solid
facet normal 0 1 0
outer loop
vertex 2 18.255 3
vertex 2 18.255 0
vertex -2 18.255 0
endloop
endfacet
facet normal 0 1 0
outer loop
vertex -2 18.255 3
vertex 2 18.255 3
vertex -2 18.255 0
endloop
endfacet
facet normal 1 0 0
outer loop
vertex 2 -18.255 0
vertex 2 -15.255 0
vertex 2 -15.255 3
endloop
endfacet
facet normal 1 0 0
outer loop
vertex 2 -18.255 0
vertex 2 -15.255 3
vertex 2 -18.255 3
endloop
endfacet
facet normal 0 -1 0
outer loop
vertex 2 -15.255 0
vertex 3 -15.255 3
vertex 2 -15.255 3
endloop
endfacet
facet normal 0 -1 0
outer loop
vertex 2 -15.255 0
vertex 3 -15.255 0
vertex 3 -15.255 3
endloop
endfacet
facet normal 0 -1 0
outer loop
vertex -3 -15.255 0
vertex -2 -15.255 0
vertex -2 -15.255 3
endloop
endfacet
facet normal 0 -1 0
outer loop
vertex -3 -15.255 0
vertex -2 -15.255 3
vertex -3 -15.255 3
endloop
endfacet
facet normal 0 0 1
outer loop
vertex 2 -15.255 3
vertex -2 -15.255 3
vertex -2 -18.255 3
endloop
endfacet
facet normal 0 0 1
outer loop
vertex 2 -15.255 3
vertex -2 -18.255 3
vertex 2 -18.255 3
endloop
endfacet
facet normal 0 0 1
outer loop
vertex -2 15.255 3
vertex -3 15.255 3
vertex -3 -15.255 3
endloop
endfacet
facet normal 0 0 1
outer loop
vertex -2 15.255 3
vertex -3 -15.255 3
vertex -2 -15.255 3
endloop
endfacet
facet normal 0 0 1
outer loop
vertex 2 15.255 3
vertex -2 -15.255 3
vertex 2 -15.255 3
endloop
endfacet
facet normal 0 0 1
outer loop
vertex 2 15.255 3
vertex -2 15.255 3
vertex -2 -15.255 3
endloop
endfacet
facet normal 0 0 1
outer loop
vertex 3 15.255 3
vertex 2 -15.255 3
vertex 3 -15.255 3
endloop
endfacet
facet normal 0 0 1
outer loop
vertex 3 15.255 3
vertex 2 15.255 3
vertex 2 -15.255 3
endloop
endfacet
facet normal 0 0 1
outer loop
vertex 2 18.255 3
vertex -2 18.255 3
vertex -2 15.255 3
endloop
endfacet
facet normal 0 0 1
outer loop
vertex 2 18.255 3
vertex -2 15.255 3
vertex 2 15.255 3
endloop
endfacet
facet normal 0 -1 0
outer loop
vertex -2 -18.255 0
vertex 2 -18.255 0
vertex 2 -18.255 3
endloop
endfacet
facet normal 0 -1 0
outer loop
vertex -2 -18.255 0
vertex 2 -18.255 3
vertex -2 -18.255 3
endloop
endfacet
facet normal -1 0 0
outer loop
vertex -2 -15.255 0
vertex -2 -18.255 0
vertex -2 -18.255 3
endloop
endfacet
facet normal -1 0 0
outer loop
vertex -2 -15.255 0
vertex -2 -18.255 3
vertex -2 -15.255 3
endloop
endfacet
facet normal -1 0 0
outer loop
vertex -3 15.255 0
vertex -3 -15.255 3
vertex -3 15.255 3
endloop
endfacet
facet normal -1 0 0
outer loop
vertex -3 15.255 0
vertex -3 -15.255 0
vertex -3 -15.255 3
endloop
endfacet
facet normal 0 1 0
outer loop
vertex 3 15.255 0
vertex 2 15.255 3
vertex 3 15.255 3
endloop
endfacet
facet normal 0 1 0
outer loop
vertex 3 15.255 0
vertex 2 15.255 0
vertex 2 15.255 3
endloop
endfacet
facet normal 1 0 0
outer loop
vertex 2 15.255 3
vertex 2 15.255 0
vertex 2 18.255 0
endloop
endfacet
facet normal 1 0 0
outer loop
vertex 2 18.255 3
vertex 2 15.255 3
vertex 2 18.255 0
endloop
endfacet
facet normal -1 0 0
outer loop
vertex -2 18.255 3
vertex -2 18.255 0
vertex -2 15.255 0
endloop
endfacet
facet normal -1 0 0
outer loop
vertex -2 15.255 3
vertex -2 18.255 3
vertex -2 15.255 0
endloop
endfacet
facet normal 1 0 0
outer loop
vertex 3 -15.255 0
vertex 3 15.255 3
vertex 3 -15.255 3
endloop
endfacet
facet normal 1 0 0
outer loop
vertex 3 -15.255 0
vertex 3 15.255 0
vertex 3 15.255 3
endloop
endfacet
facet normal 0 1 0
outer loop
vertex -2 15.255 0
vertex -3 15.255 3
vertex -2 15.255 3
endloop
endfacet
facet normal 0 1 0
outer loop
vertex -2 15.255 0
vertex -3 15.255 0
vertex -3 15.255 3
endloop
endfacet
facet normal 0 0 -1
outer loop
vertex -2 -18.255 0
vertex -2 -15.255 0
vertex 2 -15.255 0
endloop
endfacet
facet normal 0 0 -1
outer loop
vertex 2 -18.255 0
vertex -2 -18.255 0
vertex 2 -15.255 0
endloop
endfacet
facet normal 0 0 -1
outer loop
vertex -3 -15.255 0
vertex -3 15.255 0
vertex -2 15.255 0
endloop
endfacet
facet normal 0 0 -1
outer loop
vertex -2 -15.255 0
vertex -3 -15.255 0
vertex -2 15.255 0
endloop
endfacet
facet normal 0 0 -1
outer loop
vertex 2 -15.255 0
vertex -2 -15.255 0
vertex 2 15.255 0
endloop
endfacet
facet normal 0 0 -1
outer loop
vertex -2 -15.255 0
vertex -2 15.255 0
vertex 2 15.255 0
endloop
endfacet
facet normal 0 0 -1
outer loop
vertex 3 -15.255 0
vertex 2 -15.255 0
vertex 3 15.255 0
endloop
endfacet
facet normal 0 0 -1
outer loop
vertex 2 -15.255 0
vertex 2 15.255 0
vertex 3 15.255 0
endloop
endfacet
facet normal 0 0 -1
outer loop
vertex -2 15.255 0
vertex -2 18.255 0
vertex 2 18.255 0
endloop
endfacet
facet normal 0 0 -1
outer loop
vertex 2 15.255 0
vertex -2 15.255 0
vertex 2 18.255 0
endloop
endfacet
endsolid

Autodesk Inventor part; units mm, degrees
ref_plane "YZ Plane" through (0, 0, 0) normal (1, 0, 0) x (0, 1, 0)
ref_plane "XZ Plane" through (0, 0, 0) normal (0, 1, 0) x (-1, 0, 0)
ref_plane "XY Plane" through (0, 0, 0) normal (0, 0, 1) x (1, 0, 0)
sketch "Sketch1" plane through (0, 0, 0) normal (0, 0, 1) x (1, 0, 0)
  line L0 (-3, 15.255) -> (3, 15.255)
  line L1 (3, 15.255) -> (3, -15.255)
  line L2 (3, -15.255) -> (-3, -15.255)
  line L3 (-3, -15.255) -> (-3, 15.255)
  line L4 (-2, -15.255) -> (2, -15.255)
  line L5 (2, -15.255) -> (2, -18.255)
  line L6 (2, -18.255) -> (-2, -18.255)
  line L7 (-2, -18.255) -> (-2, -15.255)
  line L8 (-2, 15.255) -> (2, 15.255)
  line L9 (2, 15.255) -> (2, 18.255)
  line L10 (2, 18.255) -> (-2, 18.255)
  line L11 (-2, 18.255) -> (-2, 15.255)
  line L12 (3, -12) -> (0, -12)
  line L13 (0, -12) -> (0, -8)
  line L14 (0, -8) -> (3, -8)
  line L15 (3, -8) -> (3, -12)
  line L16 (3, 8) -> (0, 8)
  line L17 (0, 8) -> (0, 12)
  line L18 (0, 12) -> (3, 12)
  line L19 (3, 12) -> (3, 8)
  point P0 (0, 0)
  point P1 (0, 0)
  point P2 (0, 18.255)
  point P3 (0, 15.255)
  point P4 (0, 15.255)
  point P5 (0, -18.255)
  point P6 (3, 0)
  point P7 (2.1852, -20.4852)
  point P8 (2.1852, 20.1148)
  point P9 (3, -10)
  point P10 (3, 10)
  point P11 (3.1852, -8.1852)
  point P12 (3.1852, 11.8148)
  dimension "d0" = 36.51
  dimension "d1" = 3
  dimension "d2" = 4
  dimension "d3" = 6
  dimension "d4" = 4
  dimension "d5" = 10
  dimension "d6" = 10
  dimension "d7" = 3
extrude "Extrusion1" add sketch "Sketch1" along normal blind 3
properties material "MDF Medium Density Fiberboard"
